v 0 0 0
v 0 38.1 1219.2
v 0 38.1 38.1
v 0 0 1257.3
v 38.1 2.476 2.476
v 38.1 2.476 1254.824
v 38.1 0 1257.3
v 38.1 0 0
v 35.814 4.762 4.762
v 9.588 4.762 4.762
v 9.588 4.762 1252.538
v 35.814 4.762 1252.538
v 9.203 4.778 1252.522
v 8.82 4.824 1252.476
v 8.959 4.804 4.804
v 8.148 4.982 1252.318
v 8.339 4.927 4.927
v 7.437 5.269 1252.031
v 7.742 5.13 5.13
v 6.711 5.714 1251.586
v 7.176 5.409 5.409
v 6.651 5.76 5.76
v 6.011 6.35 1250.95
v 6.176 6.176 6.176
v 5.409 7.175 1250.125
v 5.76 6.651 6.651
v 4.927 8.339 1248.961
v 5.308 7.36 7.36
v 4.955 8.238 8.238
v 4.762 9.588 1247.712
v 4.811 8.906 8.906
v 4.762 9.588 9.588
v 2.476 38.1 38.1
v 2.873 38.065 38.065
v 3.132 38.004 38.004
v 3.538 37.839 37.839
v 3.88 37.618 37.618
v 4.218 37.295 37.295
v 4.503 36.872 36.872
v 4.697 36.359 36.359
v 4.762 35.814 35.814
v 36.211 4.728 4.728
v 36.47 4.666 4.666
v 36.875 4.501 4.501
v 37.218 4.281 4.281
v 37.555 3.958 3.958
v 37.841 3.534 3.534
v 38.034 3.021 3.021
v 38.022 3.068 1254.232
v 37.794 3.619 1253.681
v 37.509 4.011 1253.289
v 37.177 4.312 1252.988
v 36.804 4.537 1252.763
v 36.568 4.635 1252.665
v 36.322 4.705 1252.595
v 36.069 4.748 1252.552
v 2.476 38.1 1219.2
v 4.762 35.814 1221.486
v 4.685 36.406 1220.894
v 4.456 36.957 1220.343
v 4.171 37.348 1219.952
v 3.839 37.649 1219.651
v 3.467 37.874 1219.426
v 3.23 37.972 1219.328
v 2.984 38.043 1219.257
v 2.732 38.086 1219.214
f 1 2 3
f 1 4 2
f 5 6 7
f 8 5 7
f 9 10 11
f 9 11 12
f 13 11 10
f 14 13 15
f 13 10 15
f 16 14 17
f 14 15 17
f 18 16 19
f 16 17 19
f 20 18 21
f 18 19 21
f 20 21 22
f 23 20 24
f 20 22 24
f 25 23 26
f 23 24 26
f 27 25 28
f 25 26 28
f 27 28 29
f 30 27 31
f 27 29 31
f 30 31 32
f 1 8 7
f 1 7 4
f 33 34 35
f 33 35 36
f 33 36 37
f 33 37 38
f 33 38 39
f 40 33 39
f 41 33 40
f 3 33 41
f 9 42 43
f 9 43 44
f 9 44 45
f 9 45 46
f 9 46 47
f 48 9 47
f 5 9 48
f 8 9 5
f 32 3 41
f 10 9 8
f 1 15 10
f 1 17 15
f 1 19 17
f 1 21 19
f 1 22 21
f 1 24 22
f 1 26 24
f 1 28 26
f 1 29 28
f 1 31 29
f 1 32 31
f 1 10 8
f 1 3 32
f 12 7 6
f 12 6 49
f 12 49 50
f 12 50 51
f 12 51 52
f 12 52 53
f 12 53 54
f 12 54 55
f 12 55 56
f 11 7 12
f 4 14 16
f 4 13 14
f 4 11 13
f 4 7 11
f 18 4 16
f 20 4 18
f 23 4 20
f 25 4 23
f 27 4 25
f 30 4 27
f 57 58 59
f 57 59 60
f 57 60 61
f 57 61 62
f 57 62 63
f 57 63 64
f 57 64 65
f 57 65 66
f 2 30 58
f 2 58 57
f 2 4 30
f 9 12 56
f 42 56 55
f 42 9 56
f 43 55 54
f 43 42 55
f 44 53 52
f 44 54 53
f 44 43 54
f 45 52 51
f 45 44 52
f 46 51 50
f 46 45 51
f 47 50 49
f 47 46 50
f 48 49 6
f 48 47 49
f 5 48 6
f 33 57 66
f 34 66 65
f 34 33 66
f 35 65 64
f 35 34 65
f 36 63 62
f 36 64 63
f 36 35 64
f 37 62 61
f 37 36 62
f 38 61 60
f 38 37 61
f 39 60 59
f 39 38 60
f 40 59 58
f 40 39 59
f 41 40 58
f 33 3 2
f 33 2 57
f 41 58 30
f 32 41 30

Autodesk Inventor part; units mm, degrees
ref_plane "Start plane" through (0, 0, 0) normal (0, 0, 1) x (1, 0, 0)
ref_plane "End plane" through (0, 0, 1257.3) normal (0, 0, 1) x (1, 0, 0)
sketch "Sketch" plane through (0, 0, 0) normal (0, 0, 1) x (1, 0, 0)
  line L0 (38.1, 0) -> (0, 0)
  line L1 (0, 0) -> (0, 38.1)
  line L2 (0, 38.1) -> (2.4765, 38.1)
  line L3 (4.7625, 35.814) -> (4.7625, 9.5885)
  line L4 (9.5885, 4.7625) -> (35.814, 4.7625)
  line L5 (38.1, 2.4765) -> (38.1, 0)
  line L6 (0, -11.0414) -> (0, 31.5385) construction
  line L7 (-11.0414, 0) -> (31.5385, 0) construction
  arc A0 (4.7625, 9.5885) -> (9.5885, 4.7625) centre (9.5885, 9.5885) ccw
  arc A1 (4.7625, 35.814) -> (2.4765, 38.1) centre (2.4765, 35.814) ccw
  arc A2 (38.1, 2.4765) -> (35.814, 4.7625) centre (35.814, 2.4765) ccw
  line L8 (0, 48.4964) -> (0, -20.9644) construction
  line L9 (-20.9644, 0) -> (48.4964, 0) construction
  point P0 (4.7625, 38.1)
  point P1 (4.7625, 4.7625)
  point P2 (38.1, 4.7625)
  dimension "d0" = 38.1
  dimension "d1" = 38.1
  dimension "d2" = 4.7625
  dimension "d3" = 4.7625
  dimension "d10" = 0
  dimension "d11" = 0
  dimension "d14" = 4.826
  dimension "d15" = 2.286
extrude "Body" add sketch "Sketch" along normal up to surface (1257.3 mm away) from surface at 0
sketch "Sketch3" plane through (0, 0, 0) normal (0, 0, 1) x (1, 0, 0)
  line L0 (0, 0) -> (10, 0)
ref_plane "Work Plane3" through (0, 0, 0) normal (0, -1, 0) x (1, 0, 0)
sketch "Sketch4" plane through (0, 0, 0) normal (0, -1, 0) x (1, 0, 0)
  line L0 (-2, 0) -> (12, 0)
  line L1 (-2, 1257.3) -> (12, 1257.3)
  dimension "d17" = 1257.3
ref_plane "Work Plane4" through (19.05, 0, 1257.3) normal (0, 0.7071, 0.7071) x (1, 0, 0)
split "Split1" plane through (19.05, 0, 1257.3) removes the side toward (0, 0.7071, 0.7071)
ref_plane "Work Plane5" through (19.05, 0, 0) normal (0, 0.7071, -0.7071) x (1, 0, 0)
split "Split2" plane through (19.05, 0, 0) removes the side toward (0, 0.7071, -0.7071)
equation "\"d0\" = G_H"
equation "\"d1\" = G_H"
equation "\"d2\" = G_T"
equation "\"d3\" = G_T"
equation "\"d14\" = G_IR"
equation "\"d15\" = G_ER"
equation "\"d4\" = G_L"
equation "\"G_H\" = 38.1"
equation "\"G_T\" = 4.7625"
equation "\"G_ER\" = 2.286"
equation "\"G_IR\" = 4.826"
equation "\"G_L\" = d17"
equation "\"ex\" = 0"
equation "\"G_OFFSET_START\" = 0"
equation "\"G_OFFSET_END\" = 0"
equation "\"d13\" = G_OFFSET_END + B_L"
equation "\"B_L\" = 1257.3"
properties part number "AISC - L 1.5 x 1.5 x 3/16 - 49.5" material "Aluminum 6061-AHC"
